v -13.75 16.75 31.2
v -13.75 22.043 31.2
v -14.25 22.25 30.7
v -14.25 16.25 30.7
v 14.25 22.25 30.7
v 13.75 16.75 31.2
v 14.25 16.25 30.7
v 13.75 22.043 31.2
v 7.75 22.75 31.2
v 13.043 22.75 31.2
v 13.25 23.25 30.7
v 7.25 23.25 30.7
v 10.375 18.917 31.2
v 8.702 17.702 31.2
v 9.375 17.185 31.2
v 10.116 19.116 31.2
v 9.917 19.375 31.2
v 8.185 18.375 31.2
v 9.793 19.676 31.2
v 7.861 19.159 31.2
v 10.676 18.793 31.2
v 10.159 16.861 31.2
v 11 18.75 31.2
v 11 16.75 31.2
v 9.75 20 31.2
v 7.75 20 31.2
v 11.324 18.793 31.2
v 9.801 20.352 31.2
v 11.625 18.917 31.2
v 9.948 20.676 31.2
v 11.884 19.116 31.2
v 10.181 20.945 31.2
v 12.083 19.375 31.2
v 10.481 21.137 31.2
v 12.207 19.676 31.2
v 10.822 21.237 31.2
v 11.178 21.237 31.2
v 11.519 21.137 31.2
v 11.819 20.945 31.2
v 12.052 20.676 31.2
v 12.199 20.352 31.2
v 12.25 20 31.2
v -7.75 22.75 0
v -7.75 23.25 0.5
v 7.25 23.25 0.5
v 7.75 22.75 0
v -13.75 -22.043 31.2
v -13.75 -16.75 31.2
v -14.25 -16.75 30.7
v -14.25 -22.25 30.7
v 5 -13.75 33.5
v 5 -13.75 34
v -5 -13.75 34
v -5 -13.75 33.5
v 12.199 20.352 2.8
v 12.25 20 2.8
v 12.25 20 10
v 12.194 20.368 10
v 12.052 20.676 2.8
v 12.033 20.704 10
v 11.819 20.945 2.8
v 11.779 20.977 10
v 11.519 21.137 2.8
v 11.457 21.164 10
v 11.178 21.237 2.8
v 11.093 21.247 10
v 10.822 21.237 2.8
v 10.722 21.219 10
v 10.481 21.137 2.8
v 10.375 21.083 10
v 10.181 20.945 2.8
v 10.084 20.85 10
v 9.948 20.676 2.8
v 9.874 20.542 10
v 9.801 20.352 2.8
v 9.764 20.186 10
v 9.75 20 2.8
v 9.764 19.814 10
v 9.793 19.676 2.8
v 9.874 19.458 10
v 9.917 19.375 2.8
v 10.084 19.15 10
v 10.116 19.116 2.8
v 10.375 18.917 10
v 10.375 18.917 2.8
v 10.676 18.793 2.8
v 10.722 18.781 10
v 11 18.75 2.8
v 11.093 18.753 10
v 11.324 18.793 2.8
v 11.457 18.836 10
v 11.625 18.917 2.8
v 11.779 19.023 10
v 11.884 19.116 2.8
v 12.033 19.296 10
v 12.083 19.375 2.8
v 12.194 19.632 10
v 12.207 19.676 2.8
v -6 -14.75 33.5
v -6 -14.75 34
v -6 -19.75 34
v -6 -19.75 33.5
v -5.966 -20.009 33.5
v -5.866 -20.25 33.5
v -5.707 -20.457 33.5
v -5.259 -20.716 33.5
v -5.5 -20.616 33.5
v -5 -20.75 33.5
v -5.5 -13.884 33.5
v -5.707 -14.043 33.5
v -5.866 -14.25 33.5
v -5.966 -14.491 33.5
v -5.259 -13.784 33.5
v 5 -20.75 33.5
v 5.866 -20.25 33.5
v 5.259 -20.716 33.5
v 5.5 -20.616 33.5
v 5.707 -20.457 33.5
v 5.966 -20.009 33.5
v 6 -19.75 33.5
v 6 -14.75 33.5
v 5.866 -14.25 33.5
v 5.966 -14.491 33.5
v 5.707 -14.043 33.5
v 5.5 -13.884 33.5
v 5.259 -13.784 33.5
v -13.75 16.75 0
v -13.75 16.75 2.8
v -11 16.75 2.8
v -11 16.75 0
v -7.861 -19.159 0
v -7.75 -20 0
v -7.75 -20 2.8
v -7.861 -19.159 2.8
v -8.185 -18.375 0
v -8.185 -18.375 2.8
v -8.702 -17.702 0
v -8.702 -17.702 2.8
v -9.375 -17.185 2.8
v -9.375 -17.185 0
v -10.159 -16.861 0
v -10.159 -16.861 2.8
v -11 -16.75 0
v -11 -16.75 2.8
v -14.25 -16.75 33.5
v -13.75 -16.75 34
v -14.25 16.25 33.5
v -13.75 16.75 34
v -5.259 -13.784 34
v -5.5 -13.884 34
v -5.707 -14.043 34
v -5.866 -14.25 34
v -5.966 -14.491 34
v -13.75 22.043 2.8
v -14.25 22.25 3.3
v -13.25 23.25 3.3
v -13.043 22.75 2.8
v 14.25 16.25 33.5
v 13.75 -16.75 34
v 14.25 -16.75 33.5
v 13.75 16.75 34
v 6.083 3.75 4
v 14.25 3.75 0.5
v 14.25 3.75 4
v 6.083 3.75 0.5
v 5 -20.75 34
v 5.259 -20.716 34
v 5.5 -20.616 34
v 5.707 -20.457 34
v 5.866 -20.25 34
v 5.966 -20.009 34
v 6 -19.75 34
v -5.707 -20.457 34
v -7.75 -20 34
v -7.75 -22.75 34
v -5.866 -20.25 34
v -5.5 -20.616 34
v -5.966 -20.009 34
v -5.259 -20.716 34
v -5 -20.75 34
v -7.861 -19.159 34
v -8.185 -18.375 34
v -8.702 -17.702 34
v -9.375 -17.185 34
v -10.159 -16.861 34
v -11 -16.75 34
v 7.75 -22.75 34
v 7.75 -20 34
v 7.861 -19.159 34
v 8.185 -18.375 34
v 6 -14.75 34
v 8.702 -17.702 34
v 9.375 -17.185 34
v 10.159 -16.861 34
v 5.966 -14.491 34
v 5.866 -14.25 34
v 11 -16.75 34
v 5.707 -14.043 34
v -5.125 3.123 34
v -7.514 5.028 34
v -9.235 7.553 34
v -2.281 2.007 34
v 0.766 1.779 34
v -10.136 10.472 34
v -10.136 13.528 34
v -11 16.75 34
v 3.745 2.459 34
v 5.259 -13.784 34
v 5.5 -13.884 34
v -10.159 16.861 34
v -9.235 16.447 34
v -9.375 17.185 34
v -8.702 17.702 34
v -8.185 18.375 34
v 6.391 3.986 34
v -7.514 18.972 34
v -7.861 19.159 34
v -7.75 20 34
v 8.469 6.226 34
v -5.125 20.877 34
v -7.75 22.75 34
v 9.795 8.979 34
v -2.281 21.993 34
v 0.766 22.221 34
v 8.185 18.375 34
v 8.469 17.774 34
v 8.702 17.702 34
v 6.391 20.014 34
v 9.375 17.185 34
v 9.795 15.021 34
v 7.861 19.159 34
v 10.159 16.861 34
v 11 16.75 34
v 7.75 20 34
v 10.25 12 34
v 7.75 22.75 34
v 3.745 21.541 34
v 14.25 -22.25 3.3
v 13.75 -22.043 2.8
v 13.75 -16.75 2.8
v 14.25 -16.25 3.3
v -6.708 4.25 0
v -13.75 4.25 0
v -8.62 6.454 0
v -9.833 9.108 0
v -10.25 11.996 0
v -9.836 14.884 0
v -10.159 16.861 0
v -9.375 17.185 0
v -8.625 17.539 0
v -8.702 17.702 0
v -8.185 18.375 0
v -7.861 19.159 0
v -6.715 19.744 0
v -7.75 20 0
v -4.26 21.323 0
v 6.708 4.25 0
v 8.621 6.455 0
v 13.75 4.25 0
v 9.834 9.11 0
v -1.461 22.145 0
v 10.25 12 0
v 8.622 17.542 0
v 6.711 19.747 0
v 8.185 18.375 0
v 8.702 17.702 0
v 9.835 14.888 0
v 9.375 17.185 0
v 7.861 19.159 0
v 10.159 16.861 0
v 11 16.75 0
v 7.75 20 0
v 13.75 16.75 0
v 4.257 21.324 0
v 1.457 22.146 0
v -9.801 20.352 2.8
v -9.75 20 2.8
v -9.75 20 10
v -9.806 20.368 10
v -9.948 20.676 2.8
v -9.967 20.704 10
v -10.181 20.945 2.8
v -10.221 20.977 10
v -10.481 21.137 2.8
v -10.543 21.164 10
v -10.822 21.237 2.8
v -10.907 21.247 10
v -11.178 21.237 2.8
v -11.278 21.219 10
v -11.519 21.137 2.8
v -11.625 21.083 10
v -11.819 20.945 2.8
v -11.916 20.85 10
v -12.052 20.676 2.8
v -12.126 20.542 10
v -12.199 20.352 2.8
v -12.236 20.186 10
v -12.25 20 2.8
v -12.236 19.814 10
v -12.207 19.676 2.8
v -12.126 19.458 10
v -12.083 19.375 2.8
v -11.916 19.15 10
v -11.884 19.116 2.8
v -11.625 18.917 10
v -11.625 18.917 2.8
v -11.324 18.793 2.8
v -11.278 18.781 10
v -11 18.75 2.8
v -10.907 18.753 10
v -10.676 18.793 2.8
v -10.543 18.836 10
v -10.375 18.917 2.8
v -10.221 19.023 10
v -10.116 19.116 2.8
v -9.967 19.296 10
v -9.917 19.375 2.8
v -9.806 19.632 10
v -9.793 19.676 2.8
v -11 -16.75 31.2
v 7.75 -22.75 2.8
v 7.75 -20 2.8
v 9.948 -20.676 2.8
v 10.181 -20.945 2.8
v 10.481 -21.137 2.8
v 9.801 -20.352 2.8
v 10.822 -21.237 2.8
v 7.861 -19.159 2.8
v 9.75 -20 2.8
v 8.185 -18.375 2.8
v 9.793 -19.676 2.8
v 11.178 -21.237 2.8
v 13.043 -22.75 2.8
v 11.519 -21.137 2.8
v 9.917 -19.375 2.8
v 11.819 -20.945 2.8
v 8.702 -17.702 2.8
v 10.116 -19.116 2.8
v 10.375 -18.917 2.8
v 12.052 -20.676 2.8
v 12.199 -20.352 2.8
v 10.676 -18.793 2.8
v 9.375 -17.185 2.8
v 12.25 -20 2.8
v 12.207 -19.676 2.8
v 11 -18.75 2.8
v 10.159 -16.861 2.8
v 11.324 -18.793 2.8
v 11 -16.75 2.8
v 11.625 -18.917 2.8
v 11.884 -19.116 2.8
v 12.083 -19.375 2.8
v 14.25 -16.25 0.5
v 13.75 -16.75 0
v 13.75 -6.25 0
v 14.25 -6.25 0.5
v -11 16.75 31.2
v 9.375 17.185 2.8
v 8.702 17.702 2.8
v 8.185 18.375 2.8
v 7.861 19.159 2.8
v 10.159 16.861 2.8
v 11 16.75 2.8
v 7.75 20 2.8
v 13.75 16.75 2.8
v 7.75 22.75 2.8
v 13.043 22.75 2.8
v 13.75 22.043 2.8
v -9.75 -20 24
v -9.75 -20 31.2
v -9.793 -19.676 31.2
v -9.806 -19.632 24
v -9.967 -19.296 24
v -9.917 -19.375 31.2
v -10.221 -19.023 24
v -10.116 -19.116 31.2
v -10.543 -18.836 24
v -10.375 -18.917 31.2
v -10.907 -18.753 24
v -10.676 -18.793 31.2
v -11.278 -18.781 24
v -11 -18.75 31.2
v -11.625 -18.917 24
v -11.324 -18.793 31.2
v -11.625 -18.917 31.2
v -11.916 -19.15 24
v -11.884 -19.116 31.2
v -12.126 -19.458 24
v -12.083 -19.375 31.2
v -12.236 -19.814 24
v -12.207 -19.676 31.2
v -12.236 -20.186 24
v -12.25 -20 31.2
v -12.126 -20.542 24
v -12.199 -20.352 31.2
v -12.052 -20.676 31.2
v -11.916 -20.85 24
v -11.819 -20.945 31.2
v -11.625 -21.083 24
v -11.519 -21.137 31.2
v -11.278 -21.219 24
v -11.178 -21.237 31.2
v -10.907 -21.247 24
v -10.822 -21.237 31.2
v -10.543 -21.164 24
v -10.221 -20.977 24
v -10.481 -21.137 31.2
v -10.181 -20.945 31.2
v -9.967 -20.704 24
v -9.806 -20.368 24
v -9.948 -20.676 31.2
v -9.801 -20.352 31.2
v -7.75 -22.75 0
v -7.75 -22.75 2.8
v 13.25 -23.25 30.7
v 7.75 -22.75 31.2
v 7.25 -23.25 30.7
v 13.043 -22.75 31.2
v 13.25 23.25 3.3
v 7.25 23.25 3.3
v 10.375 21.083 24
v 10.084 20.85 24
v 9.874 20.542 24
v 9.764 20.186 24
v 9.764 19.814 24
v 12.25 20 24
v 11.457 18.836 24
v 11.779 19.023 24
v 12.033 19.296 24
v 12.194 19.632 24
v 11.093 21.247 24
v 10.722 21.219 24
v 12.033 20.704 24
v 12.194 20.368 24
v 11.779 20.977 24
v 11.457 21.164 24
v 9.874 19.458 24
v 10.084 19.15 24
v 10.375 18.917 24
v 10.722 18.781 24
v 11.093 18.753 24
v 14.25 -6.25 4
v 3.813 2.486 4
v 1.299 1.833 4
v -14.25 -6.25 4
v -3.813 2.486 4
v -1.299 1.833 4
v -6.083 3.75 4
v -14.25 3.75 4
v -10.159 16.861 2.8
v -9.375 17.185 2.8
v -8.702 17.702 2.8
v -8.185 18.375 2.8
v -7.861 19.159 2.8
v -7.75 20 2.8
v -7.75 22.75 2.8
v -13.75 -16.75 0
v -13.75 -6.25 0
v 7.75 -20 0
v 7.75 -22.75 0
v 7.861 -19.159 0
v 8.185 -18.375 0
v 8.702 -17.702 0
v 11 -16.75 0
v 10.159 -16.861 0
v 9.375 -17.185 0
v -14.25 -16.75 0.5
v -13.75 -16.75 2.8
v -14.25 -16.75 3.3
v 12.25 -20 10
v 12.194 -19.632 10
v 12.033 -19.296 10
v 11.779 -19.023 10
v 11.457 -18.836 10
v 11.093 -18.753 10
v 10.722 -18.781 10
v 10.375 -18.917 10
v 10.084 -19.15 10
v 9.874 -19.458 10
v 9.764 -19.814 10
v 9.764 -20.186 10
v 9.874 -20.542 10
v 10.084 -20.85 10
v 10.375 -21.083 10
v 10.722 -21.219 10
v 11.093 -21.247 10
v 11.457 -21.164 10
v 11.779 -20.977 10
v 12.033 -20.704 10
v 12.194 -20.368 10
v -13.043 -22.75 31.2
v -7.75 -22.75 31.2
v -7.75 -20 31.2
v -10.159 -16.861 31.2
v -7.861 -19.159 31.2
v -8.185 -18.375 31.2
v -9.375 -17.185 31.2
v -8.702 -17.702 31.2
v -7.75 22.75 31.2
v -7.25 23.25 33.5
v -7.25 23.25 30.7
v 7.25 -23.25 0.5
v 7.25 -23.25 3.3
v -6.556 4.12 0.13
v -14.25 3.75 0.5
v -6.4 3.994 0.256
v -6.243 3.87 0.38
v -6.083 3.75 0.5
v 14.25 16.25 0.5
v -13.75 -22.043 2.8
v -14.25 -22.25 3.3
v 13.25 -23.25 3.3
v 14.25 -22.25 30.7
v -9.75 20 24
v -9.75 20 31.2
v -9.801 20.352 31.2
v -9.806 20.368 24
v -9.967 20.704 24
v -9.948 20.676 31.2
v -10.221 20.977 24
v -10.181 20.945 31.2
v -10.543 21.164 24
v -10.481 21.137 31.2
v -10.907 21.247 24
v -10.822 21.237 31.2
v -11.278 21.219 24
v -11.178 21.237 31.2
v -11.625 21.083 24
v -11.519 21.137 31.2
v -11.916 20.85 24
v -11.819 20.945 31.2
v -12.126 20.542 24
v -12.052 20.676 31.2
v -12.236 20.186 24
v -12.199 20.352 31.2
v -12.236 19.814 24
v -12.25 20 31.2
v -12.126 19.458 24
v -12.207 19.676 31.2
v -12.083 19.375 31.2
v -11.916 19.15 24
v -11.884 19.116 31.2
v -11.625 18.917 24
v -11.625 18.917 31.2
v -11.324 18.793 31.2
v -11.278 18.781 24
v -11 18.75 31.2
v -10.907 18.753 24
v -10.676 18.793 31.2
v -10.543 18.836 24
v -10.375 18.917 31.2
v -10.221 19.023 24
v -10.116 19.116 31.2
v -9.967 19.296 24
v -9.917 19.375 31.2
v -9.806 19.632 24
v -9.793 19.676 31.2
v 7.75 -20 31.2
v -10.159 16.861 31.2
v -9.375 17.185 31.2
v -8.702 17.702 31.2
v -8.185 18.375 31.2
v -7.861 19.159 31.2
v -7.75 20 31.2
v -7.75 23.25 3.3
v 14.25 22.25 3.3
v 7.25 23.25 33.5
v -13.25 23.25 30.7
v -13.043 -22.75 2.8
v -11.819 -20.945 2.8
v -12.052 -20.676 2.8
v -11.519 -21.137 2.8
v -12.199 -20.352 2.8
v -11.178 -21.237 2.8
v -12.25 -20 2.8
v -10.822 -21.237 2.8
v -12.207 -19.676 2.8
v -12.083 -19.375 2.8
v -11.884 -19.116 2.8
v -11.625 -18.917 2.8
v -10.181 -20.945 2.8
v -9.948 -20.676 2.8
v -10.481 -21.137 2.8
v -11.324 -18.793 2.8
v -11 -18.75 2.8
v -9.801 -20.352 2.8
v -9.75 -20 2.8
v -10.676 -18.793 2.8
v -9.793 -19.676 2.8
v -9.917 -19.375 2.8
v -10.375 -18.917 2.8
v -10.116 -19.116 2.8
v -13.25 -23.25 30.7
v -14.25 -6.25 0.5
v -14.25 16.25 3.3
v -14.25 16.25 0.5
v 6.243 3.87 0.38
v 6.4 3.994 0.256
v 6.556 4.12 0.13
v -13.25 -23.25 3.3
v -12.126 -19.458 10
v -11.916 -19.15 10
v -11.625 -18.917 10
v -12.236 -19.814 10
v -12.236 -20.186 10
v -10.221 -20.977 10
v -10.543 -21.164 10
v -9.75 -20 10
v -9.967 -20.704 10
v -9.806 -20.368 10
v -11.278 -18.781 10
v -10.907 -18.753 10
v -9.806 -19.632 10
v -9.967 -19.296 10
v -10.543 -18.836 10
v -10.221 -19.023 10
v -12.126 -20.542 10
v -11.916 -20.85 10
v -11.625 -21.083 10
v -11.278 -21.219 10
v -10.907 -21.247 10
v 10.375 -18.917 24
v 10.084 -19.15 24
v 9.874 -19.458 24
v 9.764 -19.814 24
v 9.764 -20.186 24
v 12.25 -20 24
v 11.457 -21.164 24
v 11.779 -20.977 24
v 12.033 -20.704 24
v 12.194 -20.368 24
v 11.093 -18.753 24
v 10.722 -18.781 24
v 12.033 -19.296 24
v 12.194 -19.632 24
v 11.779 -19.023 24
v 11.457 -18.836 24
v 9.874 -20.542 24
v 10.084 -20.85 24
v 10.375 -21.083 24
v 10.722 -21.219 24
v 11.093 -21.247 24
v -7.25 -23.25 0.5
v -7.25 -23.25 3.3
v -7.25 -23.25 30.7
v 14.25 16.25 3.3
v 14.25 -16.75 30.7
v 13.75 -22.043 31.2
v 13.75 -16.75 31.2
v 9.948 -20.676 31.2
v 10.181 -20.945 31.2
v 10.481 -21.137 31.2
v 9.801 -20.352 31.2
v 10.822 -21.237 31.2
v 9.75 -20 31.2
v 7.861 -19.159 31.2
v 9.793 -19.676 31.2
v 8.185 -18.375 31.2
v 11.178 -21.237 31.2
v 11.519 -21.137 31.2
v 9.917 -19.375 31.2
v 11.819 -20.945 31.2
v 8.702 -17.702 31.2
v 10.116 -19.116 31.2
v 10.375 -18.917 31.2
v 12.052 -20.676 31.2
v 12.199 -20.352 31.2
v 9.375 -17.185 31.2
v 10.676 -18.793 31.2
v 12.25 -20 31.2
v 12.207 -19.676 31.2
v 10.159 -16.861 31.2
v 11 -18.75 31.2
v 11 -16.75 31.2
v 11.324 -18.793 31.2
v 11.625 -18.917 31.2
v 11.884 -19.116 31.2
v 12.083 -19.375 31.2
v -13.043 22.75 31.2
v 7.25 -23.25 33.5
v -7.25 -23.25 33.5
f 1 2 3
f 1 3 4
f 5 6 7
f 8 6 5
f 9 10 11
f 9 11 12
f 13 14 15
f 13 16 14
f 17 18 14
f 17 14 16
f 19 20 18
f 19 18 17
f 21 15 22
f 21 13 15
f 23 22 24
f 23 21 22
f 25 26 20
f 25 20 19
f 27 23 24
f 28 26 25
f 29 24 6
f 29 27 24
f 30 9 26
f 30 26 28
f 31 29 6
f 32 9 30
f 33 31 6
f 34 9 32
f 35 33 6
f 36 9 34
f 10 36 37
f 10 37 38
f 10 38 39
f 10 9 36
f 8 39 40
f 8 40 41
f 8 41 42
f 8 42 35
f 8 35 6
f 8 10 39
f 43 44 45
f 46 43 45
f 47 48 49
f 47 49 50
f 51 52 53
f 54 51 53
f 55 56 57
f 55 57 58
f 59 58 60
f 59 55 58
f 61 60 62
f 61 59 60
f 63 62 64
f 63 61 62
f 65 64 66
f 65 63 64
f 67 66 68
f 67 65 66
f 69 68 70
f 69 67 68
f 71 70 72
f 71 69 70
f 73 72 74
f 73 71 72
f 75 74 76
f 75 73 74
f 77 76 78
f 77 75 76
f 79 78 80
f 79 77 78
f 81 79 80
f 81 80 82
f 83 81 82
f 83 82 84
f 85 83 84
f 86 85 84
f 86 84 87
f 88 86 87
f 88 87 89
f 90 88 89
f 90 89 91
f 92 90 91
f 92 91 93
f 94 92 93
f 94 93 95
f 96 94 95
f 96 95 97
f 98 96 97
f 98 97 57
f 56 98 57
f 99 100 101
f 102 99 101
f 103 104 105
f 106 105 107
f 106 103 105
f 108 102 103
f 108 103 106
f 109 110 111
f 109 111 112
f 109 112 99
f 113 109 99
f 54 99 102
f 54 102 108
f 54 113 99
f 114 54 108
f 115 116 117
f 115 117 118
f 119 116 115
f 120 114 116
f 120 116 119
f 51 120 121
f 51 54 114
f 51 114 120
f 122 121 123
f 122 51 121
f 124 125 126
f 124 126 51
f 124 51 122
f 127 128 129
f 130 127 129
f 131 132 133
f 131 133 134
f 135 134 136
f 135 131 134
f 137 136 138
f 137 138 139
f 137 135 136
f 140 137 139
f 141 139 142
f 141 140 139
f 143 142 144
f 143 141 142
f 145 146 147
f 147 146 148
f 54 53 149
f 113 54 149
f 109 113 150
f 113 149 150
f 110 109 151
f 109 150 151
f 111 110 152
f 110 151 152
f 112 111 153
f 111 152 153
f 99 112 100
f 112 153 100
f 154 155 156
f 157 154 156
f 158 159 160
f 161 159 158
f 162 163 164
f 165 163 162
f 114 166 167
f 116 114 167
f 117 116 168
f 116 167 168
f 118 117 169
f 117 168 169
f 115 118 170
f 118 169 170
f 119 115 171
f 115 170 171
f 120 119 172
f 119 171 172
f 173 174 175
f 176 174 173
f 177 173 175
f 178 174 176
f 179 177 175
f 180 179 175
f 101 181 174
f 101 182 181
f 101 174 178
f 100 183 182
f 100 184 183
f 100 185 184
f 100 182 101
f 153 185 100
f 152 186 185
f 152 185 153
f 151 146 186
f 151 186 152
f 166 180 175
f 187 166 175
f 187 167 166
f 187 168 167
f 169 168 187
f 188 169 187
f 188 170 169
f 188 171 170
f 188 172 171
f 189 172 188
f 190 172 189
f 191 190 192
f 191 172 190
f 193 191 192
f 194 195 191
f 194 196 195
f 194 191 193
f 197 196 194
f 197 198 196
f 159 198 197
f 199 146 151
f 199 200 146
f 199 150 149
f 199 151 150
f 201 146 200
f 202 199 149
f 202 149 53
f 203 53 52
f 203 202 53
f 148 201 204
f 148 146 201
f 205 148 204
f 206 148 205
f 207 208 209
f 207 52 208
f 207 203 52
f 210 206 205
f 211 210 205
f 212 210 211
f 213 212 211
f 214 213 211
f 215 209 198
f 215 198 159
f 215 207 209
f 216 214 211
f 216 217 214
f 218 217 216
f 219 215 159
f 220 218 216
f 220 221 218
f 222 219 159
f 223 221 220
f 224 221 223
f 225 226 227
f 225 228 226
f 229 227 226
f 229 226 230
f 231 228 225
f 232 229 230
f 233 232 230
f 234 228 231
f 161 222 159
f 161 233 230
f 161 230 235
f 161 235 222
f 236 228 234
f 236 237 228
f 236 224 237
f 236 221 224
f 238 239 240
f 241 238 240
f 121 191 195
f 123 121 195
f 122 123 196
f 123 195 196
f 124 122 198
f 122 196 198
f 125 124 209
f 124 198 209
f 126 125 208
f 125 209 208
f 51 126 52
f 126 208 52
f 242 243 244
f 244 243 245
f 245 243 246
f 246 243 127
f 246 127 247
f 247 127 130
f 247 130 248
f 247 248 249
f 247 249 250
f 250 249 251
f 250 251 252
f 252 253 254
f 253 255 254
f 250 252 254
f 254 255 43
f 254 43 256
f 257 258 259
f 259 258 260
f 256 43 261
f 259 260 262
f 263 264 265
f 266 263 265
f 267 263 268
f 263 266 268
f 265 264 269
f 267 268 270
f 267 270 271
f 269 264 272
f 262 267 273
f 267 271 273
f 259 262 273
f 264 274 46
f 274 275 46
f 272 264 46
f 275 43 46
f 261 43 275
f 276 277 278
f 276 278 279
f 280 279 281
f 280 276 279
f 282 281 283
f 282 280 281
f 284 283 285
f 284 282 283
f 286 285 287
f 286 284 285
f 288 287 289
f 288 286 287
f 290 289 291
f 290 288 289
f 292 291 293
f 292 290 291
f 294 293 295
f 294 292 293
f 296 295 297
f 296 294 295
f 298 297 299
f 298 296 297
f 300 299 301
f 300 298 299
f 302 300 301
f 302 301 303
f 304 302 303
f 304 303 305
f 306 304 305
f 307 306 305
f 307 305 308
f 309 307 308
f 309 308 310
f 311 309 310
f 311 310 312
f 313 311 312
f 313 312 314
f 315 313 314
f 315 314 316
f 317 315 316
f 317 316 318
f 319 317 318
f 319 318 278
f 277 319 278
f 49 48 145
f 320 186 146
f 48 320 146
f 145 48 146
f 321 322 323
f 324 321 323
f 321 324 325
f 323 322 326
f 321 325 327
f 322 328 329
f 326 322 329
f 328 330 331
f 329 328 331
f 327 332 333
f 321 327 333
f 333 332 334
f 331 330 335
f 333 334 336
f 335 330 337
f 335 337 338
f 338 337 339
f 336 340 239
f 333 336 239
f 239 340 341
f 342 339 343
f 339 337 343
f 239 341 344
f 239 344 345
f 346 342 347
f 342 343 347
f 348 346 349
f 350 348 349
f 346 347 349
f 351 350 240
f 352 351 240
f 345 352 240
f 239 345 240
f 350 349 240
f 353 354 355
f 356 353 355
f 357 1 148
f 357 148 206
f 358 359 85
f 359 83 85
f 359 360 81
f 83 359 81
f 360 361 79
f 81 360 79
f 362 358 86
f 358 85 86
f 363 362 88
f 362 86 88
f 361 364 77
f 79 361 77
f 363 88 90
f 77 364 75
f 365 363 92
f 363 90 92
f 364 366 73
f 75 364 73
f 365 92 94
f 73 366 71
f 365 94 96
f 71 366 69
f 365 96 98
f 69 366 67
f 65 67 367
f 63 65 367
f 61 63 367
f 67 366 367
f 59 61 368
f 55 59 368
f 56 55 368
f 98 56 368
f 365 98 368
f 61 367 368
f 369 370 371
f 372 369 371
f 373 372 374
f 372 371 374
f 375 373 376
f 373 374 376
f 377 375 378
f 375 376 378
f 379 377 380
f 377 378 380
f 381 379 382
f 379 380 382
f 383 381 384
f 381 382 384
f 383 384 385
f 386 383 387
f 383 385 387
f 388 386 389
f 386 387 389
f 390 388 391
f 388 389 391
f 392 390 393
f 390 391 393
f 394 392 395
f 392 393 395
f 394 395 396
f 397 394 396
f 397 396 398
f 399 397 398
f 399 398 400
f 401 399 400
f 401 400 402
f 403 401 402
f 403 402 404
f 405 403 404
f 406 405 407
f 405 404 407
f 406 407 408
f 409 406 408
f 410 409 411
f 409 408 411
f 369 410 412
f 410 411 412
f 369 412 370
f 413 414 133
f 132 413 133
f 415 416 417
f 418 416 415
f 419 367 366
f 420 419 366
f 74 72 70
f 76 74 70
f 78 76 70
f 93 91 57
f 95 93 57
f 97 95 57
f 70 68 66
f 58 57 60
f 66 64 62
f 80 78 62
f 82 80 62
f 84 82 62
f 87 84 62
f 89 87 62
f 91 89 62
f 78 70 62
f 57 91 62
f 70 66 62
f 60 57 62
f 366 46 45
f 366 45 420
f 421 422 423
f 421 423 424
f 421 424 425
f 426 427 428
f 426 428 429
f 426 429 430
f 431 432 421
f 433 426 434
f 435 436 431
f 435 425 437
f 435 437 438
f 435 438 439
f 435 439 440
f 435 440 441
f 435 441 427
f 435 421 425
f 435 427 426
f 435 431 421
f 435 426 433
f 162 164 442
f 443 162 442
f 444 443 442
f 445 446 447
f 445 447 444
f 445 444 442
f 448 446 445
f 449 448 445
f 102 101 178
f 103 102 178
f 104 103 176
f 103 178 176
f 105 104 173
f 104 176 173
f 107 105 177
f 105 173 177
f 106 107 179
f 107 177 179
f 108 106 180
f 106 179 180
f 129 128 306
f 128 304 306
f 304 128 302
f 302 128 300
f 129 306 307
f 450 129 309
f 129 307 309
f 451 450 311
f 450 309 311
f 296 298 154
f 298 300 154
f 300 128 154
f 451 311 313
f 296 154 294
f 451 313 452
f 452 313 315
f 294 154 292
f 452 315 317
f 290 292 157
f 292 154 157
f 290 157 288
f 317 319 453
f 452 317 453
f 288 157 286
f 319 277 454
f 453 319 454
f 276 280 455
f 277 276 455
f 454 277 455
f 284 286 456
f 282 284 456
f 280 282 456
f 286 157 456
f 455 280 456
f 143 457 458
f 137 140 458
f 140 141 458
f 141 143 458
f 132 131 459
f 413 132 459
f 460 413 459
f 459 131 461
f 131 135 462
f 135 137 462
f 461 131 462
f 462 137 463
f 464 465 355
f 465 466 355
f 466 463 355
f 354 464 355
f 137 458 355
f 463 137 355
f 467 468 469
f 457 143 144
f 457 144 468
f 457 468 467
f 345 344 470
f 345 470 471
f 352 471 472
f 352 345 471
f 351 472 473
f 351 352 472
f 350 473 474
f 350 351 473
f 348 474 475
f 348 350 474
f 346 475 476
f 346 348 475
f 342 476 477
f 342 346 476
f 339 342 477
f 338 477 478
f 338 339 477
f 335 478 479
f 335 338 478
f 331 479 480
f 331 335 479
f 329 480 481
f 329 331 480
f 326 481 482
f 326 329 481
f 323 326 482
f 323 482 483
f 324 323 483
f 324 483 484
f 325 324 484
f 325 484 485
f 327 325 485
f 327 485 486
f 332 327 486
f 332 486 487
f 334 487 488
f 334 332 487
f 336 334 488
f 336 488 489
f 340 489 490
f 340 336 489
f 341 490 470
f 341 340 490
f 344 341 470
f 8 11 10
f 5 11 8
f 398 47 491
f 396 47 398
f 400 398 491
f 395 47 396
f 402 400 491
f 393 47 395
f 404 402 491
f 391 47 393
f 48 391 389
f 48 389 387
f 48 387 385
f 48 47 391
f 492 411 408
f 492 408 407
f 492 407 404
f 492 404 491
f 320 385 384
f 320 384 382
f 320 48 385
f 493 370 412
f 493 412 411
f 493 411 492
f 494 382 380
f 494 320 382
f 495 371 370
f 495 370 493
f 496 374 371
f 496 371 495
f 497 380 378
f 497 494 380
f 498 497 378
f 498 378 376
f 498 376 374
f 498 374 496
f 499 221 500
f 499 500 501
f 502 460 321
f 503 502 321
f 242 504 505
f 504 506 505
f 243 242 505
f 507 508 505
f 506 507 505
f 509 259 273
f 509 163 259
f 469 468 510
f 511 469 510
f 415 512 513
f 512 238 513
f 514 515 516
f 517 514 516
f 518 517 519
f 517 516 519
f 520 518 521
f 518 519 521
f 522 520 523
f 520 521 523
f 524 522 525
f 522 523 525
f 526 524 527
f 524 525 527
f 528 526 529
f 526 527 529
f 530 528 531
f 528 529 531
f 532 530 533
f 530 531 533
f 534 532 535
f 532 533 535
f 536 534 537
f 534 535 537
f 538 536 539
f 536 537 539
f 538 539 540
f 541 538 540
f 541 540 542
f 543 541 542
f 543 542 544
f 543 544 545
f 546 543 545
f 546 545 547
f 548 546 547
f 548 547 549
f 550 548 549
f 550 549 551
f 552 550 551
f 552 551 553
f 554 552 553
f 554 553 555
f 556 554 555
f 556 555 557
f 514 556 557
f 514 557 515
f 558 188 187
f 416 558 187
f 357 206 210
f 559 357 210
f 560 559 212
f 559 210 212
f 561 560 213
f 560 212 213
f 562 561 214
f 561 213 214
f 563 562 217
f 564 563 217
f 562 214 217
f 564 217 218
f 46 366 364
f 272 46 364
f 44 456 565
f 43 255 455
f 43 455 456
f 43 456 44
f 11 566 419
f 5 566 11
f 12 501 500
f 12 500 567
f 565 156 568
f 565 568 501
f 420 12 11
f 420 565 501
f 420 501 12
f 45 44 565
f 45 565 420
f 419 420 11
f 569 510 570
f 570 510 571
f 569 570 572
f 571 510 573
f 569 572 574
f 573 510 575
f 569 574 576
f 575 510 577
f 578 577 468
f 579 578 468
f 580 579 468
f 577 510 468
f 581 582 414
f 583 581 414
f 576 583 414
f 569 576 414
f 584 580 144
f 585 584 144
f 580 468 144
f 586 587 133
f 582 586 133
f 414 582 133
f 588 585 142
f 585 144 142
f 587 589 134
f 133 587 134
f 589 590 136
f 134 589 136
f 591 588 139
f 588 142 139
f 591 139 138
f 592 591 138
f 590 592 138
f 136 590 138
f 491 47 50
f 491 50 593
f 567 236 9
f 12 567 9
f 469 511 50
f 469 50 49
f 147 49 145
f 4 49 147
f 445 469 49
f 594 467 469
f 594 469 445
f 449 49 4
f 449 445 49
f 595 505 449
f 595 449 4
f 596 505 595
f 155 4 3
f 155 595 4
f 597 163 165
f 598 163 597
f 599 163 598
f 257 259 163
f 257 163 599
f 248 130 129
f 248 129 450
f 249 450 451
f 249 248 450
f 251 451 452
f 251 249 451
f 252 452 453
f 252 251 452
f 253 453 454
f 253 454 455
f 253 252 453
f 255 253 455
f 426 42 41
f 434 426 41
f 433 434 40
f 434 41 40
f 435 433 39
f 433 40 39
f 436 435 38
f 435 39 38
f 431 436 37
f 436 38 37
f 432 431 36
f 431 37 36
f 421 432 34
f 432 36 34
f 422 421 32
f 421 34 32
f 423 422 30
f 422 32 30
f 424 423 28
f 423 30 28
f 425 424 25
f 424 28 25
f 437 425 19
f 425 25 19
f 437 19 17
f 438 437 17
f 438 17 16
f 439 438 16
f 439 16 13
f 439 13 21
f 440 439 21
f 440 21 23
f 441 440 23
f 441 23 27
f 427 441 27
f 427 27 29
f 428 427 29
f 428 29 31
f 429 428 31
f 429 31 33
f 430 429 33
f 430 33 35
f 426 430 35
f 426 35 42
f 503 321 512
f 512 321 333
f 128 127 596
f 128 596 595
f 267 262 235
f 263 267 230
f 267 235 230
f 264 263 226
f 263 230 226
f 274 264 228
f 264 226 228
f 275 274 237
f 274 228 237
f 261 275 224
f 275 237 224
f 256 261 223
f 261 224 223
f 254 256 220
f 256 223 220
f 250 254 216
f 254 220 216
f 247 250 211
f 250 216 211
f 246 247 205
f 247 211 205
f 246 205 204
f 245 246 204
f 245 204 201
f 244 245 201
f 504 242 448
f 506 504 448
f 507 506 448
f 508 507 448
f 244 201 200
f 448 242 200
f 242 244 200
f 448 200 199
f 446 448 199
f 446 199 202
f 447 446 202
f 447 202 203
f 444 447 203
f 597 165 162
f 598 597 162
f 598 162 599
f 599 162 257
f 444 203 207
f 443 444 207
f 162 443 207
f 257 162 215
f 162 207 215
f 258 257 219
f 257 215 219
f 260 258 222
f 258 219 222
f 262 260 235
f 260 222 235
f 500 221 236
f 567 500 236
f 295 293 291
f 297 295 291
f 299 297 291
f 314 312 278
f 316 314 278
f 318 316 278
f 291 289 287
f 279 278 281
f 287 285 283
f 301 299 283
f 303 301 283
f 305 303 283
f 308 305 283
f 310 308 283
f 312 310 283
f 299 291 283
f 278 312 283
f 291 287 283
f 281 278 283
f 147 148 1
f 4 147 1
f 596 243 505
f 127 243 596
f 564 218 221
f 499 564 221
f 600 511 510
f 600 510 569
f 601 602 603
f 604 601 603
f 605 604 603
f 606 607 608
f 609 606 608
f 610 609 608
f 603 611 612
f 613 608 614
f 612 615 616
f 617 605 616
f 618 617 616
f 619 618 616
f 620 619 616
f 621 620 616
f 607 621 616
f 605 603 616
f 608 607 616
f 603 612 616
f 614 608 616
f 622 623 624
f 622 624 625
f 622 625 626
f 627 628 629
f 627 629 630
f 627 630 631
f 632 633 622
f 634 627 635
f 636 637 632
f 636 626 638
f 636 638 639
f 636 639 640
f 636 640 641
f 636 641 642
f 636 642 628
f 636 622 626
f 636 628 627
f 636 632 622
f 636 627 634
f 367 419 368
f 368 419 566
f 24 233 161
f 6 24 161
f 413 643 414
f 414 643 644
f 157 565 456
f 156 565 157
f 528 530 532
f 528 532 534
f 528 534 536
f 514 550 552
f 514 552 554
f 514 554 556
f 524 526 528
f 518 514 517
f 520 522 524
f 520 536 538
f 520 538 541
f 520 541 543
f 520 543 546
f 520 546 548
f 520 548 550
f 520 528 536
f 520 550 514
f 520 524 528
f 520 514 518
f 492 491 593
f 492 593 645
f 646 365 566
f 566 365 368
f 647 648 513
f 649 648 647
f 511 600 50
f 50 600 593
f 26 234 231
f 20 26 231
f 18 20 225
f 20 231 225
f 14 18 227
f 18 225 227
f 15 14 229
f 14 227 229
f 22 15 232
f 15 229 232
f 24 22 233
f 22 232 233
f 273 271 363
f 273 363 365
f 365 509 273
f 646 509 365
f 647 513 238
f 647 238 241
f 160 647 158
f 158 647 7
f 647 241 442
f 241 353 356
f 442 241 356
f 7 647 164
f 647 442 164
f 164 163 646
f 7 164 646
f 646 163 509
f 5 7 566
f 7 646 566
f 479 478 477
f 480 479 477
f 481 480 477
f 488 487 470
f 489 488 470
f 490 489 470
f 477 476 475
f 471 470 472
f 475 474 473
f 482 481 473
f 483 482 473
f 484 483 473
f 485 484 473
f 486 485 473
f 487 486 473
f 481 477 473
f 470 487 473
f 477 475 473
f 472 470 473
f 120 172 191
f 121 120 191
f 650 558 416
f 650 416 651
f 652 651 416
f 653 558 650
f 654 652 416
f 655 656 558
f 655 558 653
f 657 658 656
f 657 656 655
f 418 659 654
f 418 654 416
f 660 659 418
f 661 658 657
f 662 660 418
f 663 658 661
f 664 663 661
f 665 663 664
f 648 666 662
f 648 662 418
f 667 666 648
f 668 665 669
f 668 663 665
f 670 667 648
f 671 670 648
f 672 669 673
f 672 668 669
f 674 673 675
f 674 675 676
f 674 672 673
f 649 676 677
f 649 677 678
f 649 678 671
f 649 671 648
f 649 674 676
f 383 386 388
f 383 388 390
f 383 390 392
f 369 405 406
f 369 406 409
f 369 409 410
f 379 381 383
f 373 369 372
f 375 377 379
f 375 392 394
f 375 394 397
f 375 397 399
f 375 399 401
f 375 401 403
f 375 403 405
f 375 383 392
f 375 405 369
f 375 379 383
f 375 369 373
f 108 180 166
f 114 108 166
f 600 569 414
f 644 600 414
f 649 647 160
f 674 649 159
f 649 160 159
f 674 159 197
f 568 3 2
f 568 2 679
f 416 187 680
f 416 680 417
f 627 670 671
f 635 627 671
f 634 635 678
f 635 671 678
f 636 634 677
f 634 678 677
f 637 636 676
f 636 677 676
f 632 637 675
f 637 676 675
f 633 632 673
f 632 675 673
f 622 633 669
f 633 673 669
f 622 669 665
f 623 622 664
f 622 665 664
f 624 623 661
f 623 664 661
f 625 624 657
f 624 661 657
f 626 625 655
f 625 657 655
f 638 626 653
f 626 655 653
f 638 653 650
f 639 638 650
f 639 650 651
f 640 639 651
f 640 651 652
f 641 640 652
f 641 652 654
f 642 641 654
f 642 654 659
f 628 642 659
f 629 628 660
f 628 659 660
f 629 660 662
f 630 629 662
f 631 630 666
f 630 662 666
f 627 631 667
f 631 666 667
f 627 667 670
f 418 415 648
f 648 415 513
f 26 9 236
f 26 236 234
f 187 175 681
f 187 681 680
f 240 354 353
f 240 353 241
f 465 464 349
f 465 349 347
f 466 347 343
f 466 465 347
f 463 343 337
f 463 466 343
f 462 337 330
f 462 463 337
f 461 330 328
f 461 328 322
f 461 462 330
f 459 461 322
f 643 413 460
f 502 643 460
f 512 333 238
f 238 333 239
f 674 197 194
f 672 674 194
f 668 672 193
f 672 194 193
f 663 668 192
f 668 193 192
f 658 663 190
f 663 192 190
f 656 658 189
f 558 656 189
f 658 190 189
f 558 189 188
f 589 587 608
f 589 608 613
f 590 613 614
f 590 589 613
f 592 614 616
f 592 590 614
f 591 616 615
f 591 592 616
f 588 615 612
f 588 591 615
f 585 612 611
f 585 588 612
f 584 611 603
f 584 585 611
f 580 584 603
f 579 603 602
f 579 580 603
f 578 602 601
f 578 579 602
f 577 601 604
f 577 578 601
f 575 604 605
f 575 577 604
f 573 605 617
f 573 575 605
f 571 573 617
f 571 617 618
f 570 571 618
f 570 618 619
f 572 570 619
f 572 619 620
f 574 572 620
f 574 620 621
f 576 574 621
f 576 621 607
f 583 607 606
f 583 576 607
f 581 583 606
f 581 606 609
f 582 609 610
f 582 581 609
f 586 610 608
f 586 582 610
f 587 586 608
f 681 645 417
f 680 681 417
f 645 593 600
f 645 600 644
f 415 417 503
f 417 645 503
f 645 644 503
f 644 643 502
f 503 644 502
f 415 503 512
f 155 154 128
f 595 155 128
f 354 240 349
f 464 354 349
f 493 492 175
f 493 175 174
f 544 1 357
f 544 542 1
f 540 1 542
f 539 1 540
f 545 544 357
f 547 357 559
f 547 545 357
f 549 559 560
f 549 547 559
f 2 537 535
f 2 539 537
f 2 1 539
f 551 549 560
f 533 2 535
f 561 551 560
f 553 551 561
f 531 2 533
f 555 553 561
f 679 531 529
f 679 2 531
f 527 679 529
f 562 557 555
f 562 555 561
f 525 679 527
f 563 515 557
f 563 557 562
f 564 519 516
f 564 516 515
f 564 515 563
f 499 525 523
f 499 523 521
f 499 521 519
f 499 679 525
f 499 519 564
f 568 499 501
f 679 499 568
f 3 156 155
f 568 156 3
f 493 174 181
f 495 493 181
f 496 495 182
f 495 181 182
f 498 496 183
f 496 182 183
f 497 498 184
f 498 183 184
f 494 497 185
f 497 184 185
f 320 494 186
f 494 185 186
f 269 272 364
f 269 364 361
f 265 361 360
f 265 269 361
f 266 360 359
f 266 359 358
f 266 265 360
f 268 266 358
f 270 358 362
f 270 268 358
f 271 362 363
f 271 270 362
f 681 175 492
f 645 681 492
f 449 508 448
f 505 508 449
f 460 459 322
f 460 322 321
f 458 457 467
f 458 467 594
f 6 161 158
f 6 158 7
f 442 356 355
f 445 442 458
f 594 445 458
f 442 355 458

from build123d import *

# Parameters (mm, degrees)
SKETCH1_W           = 28.5
SKETCH1_H           = 46.5
BOSS_EXTRUDE1_DEPTH = 34
SKETCH2_R           = 10.25
CUT_EXTRUDE1_DEPTH  = 35
SKETCH3_R           = 1.25
CUT_EXTRUDE2_DEPTH  = 10
CUT_EXTRUDE3_DEPTH  = 0.5
CUT_EXTRUDE4_DEPTH  = 2.8
SKETCH6_W           = 28.5
SKETCH6_H           = 10
CUT_EXTRUDE5_DEPTH  = 4
CHAMFER1_SIZE       = 1
CHAMFER2_SIZE       = 0.5
CHAMFER3_SIZE       = 0.5


with BuildPart() as part:
    # Sketch1 → Boss-Extrude1 (new body)
    with BuildSketch(Plane.XY):
        Rectangle(SKETCH1_W, SKETCH1_H)
    extrude(amount=BOSS_EXTRUDE1_DEPTH)

    # Sketch2 → Cut-Extrude1 (cut, through all)
    with BuildSketch(Plane.XY.offset(34)):
        with Locations((0, 12)):
            Circle(SKETCH2_R)
    extrude(amount=-CUT_EXTRUDE1_DEPTH, mode=Mode.SUBTRACT)

    # Sketch3 → Cut-Extrude2 (cut)
    with BuildSketch(Plane.XY.offset(34)):
        with Locations((-11, 20)):
            Circle(SKETCH3_R)
        with Locations((11, 20)):
            Circle(SKETCH3_R)
        with Locations((11, -20)):
            Circle(SKETCH3_R)
        with Locations((-11, -20)):
            Circle(SKETCH3_R)
    cut_extrude2 = extrude(amount=-CUT_EXTRUDE2_DEPTH, mode=Mode.SUBTRACT)

    # Sketch4 → Cut-Extrude3 (cut)
    with BuildSketch(Plane.XY.offset(34)):
        with BuildLine():
            Line((-5, -20.75), (5, -20.75))
            ThreePointArc((5, -20.75), (5.707106781, -20.457106781), (6, -19.75))
            Line((6, -19.75), (6, -14.75))
            ThreePointArc((6, -14.75), (5.707106781, -14.042893219), (5, -13.75))
            Line((5, -13.75), (-5, -13.75))
            ThreePointArc((-5, -13.75), (-5.707106781, -14.042893219), (-6, -14.75))
            Line((-6, -14.75), (-6, -19.75))
            ThreePointArc((-6, -19.75), (-5.707106781, -20.457106781), (-5, -20.75))
        make_face()
    extrude(amount=-CUT_EXTRUDE3_DEPTH, mode=Mode.SUBTRACT)

    # Sketch5 → Cut-Extrude4 (cut)
    with BuildSketch(Plane.XY.offset(34)):
        with BuildLine():
            Line((-7.75, 23.25), (-11, 23.25))
            ThreePointArc((-11, 23.25), (-8.701902961, 22.298097039), (-7.75, 20))
            Line((-7.75, 20), (-7.75, 23.25))
        make_face()
        with BuildLine():
            Line((-11, 23.25), (-14.25, 23.25))
            Line((-14.25, 23.25), (-14.25, 20))
            ThreePointArc((-14.25, 20), (-13.298097039, 22.298097039), (-11, 23.25))
        make_face()
        with BuildLine():
            ThreePointArc((-11, 16.75), (-13.298097039, 17.701902961), (-14.25, 20))
            Line((-14.25, 20), (-14.25, 16.75))
            Line((-14.25, 16.75), (-11, 16.75))
        make_face()
        with BuildLine():
            Line((-12.25, 20), (-14.25, 20))
            ThreePointArc((-14.25, 20), (-13.298097039, 17.701902961), (-11, 16.75))
            Line((-11, 16.75), (-11, 18.75))
            ThreePointArc((-11, 18.75), (-11.883883476, 19.116116524), (-12.25, 20))
        make_face()
        with BuildLine():
            ThreePointArc((-11, 16.75), (-8.701902961, 17.701902961), (-7.75, 20))
            Line((-7.75, 20), (-9.75, 20))
            ThreePointArc((-9.75, 20), (-10.116116524, 19.116116524), (-11, 18.75))
            Line((-11, 18.75), (-11, 16.75))
        make_face()
        with BuildLine():
            ThreePointArc((-7.75, 20), (-8.701902961, 22.298097039), (-11, 23.25))
            ThreePointArc((-11, 23.25), (-13.298097039, 22.298097039), (-14.25, 20))
            Line((-14.25, 20), (-12.25, 20))
            ThreePointArc((-12.25, 20), (-11, 21.25), (-9.75, 20))
            Line((-9.75, 20), (-7.75, 20))
        make_face()
        with BuildLine():
            Line((11, 23.25), (7.75, 23.25))
            Line((7.75, 23.25), (7.75, 20))
            ThreePointArc((7.75, 20), (8.701902961, 22.298097039), (11, 23.25))
        make_face()
        with BuildLine():
            Line((14.25, 23.25), (11, 23.25))
            ThreePointArc((11, 23.25), (13.298097039, 22.298097039), (14.25, 20))
            Line((14.25, 20), (14.25, 23.25))
        make_face()
        with BuildLine():
            ThreePointArc((14.25, 20), (13.298097039, 17.701902961), (11, 16.75))
            Line((11, 16.75), (14.25, 16.75))
            Line((14.25, 16.75), (14.25, 20))
        make_face()
        with BuildLine():
            Line((9.75, 20), (7.75, 20))
            ThreePointArc((7.75, 20), (8.701902961, 17.701902961), (11, 16.75))
            Line((11, 16.75), (11, 18.75))
            ThreePointArc((11, 18.75), (10.116116524, 19.116116524), (9.75, 20))
        make_face()
        with BuildLine():
            Line((11, 18.75), (11, 16.75))
            ThreePointArc((11, 16.75), (13.298097039, 17.701902961), (14.25, 20))
            Line((14.25, 20), (12.25, 20))
            ThreePointArc((12.25, 20), (11.883883476, 19.116116524), (11, 18.75))
        make_face()
        with BuildLine():
            ThreePointArc((11, 23.25), (8.701902961, 22.298097039), (7.75, 20))
            Line((7.75, 20), (9.75, 20))
            ThreePointArc((9.75, 20), (11, 21.25), (12.25, 20))
            Line((12.25, 20), (14.25, 20))
            ThreePointArc((14.25, 20), (13.298097039, 22.298097039), (11, 23.25))
        make_face()
        with BuildLine():
            ThreePointArc((-11, -16.75), (-13.298097039, -17.701902961), (-14.25, -20))
            Line((-14.25, -20), (-12.25, -20))
            ThreePointArc((-12.25, -20), (-11.883883476, -19.116116524), (-11, -18.75))
            Line((-11, -18.75), (-11, -16.75))
        make_face()
        with BuildLine():
            ThreePointArc((-7.75, -20), (-8.701902961, -17.701902961), (-11, -16.75))
            Line((-11, -16.75), (-11, -18.75))
            ThreePointArc((-11, -18.75), (-10.116116524, -19.116116524), (-9.75, -20))
            Line((-9.75, -20), (-7.75, -20))
        make_face()
        with BuildLine():
            Line((-12.25, -20), (-14.25, -20))
            ThreePointArc((-14.25, -20), (-13.298097039, -22.298097039), (-11, -23.25))
            ThreePointArc((-11, -23.25), (-8.701902961, -22.298097039), (-7.75, -20))
            Line((-7.75, -20), (-9.75, -20))
            ThreePointArc((-9.75, -20), (-11, -21.25), (-12.25, -20))
        make_face()
        with BuildLine():
            Line((-11, -16.75), (-14.25, -16.75))
            Line((-14.25, -16.75), (-14.25, -20))
            ThreePointArc((-14.25, -20), (-13.298097039, -17.701902961), (-11, -16.75))
        make_face()
        with BuildLine():
            ThreePointArc((-11, -23.25), (-13.298097039, -22.298097039), (-14.25, -20))
            Line((-14.25, -20), (-14.25, -23.25))
            Line((-14.25, -23.25), (-11, -23.25))
        make_face()
        with BuildLine():
            ThreePointArc((-7.75, -20), (-8.701902961, -22.298097039), (-11, -23.25))
            Line((-11, -23.25), (-7.75, -23.25))
            Line((-7.75, -23.25), (-7.75, -20))
        make_face()
        with BuildLine():
            Line((7.75, -20), (7.75, -23.25))
            Line((7.75, -23.25), (11, -23.25))
            ThreePointArc((11, -23.25), (8.701902961, -22.298097039), (7.75, -20))
        make_face()
        with BuildLine():
            ThreePointArc((11, -23.25), (13.298097039, -22.298097039), (14.25, -20))
            Line((14.25, -20), (12.25, -20))
            ThreePointArc((12.25, -20), (11, -21.25), (9.75, -20))
            Line((9.75, -20), (7.75, -20))
            ThreePointArc((7.75, -20), (8.701902961, -22.298097039), (11, -23.25))
        make_face()
        with BuildLine():
            Line((14.25, -23.25), (14.25, -20))
            ThreePointArc((14.25, -20), (13.298097039, -22.298097039), (11, -23.25))
            Line((11, -23.25), (14.25, -23.25))
        make_face()
        with BuildLine():
            ThreePointArc((14.25, -20), (13.298097039, -17.701902961), (11, -16.75))
            Line((11, -16.75), (11, -18.75))
            ThreePointArc((11, -18.75), (11.883883476, -19.116116524), (12.25, -20))
            Line((12.25, -20), (14.25, -20))
        make_face()
        with BuildLine():
            Line((11, -18.75), (11, -16.75))
            ThreePointArc((11, -16.75), (8.701902961, -17.701902961), (7.75, -20))
            Line((7.75, -20), (9.75, -20))
            ThreePointArc((9.75, -20), (10.116116524, -19.116116524), (11, -18.75))
        make_face()
        with BuildLine():
            Line((14.25, -20), (14.25, -16.75))
            Line((14.25, -16.75), (11, -16.75))
            ThreePointArc((11, -16.75), (13.298097039, -17.701902961), (14.25, -20))
        make_face()
    cut_extrude4 = extrude(amount=-CUT_EXTRUDE4_DEPTH, mode=Mode.SUBTRACT)

    # Mirror1: Cut-Extrude4 across plane
    add(cut_extrude4.mirror(Plane.XY.offset(17)), mode=Mode.SUBTRACT)

    # Mirror2: Cut-Extrude2 across plane
    add(cut_extrude2.mirror(Plane.XY.offset(17)), mode=Mode.SUBTRACT)

    # Sketch6 → Cut-Extrude5 (cut)
    with BuildSketch(Plane(origin=(0, 0, 0), x_dir=(-1, 0, 0), z_dir=(0, 0, -1))):
        with Locations((0, -1.25)):
            Rectangle(SKETCH6_W, SKETCH6_H)
    extrude(amount=-CUT_EXTRUDE5_DEPTH, mode=Mode.SUBTRACT)

    # Chamfer1
    chamfer1_edges = [part.edges().sort_by_distance(p)[0] for p in [
        (14.25, -23.25, 17),
        (-14.25, -23.25, 17),
        (-14.25, 23.25, 17),
        (14.25, 23.25, 17),
    ]]
    chamfer(chamfer1_edges, length=CHAMFER1_SIZE)

    # Chamfer2
    chamfer2_edges = [part.edges().sort_by_distance(p)[0] for p in [
        (-14.25, 10.25, 0),
        (0, 23.25, 0),
        (7.75, 23.25, 1.4),
        (14.25, 16.75, 1.4),
        (14.25, 19.5, 2.8),
        (-14.25, 16.75, 1.4),
        (-10.5, 23.25, 2.8),
        (14.25, 10.25, 0),
        (-14.25, 19.5, 2.8),
        (-13.75, 22.75, 2.8),
        (10.5, 23.25, 2.8),
        (13.75, 22.75, 2.8),
    ]]
    chamfer(chamfer2_edges, length=CHAMFER2_SIZE)

    # Chamfer3
    chamfer3_edges = [part.edges().sort_by_distance(p)[0] for p in [
        (-9.916381265, 3.75, 0),
        (9.916381265, 3.75, 0),
        (-14.25, -11.5, 0),
        (-14.25, -19.5, 2.8),
        (-13.75, -22.75, 31.2),
        (-13.75, -22.75, 2.8),
        (-10.5, -23.25, 2.8),
        (-7.75, -23.25, 1.4),
        (14.25, -11.5, 0),
        (14.25, -16.75, 1.4),
        (0, -23.25, 0),
        (7.75, -23.25, 1.4),
        (10.5, -23.25, 2.8),
        (14.25, -19.5, 2.8),
        (13.75, -22.75, 31.2),
        (13.75, -22.75, 2.8),
        (-14.25, -19.5, 31.2),
        (-10.5, -23.25, 31.2),
        (-7.75, -23.25, 32.6),
        (0, -23.25, 34),
        (7.75, -23.25, 32.6),
        (14.25, -19.5, 31.2),
        (10.5, -23.25, 31.2),
        (14.25, 0, 34),
        (14.25, 16.75, 32.6),
        (14.25, 19.5, 31.2),
        (13.75, 22.75, 31.2),
        (10.5, 23.25, 31.2),
        (7.75, 23.25, 32.6),
        (0, 23.25, 34),
        (-7.75, 23.25, 32.6),
        (-14.25, 0, 34),
        (-14.25, 16.75, 32.6),
        (-14.25, 19.5, 31.2),
        (-13.75, 22.75, 31.2),
        (-10.5, 23.25, 31.2),
    ]]
    chamfer(chamfer3_edges, length=CHAMFER3_SIZE)


solid = part.part
